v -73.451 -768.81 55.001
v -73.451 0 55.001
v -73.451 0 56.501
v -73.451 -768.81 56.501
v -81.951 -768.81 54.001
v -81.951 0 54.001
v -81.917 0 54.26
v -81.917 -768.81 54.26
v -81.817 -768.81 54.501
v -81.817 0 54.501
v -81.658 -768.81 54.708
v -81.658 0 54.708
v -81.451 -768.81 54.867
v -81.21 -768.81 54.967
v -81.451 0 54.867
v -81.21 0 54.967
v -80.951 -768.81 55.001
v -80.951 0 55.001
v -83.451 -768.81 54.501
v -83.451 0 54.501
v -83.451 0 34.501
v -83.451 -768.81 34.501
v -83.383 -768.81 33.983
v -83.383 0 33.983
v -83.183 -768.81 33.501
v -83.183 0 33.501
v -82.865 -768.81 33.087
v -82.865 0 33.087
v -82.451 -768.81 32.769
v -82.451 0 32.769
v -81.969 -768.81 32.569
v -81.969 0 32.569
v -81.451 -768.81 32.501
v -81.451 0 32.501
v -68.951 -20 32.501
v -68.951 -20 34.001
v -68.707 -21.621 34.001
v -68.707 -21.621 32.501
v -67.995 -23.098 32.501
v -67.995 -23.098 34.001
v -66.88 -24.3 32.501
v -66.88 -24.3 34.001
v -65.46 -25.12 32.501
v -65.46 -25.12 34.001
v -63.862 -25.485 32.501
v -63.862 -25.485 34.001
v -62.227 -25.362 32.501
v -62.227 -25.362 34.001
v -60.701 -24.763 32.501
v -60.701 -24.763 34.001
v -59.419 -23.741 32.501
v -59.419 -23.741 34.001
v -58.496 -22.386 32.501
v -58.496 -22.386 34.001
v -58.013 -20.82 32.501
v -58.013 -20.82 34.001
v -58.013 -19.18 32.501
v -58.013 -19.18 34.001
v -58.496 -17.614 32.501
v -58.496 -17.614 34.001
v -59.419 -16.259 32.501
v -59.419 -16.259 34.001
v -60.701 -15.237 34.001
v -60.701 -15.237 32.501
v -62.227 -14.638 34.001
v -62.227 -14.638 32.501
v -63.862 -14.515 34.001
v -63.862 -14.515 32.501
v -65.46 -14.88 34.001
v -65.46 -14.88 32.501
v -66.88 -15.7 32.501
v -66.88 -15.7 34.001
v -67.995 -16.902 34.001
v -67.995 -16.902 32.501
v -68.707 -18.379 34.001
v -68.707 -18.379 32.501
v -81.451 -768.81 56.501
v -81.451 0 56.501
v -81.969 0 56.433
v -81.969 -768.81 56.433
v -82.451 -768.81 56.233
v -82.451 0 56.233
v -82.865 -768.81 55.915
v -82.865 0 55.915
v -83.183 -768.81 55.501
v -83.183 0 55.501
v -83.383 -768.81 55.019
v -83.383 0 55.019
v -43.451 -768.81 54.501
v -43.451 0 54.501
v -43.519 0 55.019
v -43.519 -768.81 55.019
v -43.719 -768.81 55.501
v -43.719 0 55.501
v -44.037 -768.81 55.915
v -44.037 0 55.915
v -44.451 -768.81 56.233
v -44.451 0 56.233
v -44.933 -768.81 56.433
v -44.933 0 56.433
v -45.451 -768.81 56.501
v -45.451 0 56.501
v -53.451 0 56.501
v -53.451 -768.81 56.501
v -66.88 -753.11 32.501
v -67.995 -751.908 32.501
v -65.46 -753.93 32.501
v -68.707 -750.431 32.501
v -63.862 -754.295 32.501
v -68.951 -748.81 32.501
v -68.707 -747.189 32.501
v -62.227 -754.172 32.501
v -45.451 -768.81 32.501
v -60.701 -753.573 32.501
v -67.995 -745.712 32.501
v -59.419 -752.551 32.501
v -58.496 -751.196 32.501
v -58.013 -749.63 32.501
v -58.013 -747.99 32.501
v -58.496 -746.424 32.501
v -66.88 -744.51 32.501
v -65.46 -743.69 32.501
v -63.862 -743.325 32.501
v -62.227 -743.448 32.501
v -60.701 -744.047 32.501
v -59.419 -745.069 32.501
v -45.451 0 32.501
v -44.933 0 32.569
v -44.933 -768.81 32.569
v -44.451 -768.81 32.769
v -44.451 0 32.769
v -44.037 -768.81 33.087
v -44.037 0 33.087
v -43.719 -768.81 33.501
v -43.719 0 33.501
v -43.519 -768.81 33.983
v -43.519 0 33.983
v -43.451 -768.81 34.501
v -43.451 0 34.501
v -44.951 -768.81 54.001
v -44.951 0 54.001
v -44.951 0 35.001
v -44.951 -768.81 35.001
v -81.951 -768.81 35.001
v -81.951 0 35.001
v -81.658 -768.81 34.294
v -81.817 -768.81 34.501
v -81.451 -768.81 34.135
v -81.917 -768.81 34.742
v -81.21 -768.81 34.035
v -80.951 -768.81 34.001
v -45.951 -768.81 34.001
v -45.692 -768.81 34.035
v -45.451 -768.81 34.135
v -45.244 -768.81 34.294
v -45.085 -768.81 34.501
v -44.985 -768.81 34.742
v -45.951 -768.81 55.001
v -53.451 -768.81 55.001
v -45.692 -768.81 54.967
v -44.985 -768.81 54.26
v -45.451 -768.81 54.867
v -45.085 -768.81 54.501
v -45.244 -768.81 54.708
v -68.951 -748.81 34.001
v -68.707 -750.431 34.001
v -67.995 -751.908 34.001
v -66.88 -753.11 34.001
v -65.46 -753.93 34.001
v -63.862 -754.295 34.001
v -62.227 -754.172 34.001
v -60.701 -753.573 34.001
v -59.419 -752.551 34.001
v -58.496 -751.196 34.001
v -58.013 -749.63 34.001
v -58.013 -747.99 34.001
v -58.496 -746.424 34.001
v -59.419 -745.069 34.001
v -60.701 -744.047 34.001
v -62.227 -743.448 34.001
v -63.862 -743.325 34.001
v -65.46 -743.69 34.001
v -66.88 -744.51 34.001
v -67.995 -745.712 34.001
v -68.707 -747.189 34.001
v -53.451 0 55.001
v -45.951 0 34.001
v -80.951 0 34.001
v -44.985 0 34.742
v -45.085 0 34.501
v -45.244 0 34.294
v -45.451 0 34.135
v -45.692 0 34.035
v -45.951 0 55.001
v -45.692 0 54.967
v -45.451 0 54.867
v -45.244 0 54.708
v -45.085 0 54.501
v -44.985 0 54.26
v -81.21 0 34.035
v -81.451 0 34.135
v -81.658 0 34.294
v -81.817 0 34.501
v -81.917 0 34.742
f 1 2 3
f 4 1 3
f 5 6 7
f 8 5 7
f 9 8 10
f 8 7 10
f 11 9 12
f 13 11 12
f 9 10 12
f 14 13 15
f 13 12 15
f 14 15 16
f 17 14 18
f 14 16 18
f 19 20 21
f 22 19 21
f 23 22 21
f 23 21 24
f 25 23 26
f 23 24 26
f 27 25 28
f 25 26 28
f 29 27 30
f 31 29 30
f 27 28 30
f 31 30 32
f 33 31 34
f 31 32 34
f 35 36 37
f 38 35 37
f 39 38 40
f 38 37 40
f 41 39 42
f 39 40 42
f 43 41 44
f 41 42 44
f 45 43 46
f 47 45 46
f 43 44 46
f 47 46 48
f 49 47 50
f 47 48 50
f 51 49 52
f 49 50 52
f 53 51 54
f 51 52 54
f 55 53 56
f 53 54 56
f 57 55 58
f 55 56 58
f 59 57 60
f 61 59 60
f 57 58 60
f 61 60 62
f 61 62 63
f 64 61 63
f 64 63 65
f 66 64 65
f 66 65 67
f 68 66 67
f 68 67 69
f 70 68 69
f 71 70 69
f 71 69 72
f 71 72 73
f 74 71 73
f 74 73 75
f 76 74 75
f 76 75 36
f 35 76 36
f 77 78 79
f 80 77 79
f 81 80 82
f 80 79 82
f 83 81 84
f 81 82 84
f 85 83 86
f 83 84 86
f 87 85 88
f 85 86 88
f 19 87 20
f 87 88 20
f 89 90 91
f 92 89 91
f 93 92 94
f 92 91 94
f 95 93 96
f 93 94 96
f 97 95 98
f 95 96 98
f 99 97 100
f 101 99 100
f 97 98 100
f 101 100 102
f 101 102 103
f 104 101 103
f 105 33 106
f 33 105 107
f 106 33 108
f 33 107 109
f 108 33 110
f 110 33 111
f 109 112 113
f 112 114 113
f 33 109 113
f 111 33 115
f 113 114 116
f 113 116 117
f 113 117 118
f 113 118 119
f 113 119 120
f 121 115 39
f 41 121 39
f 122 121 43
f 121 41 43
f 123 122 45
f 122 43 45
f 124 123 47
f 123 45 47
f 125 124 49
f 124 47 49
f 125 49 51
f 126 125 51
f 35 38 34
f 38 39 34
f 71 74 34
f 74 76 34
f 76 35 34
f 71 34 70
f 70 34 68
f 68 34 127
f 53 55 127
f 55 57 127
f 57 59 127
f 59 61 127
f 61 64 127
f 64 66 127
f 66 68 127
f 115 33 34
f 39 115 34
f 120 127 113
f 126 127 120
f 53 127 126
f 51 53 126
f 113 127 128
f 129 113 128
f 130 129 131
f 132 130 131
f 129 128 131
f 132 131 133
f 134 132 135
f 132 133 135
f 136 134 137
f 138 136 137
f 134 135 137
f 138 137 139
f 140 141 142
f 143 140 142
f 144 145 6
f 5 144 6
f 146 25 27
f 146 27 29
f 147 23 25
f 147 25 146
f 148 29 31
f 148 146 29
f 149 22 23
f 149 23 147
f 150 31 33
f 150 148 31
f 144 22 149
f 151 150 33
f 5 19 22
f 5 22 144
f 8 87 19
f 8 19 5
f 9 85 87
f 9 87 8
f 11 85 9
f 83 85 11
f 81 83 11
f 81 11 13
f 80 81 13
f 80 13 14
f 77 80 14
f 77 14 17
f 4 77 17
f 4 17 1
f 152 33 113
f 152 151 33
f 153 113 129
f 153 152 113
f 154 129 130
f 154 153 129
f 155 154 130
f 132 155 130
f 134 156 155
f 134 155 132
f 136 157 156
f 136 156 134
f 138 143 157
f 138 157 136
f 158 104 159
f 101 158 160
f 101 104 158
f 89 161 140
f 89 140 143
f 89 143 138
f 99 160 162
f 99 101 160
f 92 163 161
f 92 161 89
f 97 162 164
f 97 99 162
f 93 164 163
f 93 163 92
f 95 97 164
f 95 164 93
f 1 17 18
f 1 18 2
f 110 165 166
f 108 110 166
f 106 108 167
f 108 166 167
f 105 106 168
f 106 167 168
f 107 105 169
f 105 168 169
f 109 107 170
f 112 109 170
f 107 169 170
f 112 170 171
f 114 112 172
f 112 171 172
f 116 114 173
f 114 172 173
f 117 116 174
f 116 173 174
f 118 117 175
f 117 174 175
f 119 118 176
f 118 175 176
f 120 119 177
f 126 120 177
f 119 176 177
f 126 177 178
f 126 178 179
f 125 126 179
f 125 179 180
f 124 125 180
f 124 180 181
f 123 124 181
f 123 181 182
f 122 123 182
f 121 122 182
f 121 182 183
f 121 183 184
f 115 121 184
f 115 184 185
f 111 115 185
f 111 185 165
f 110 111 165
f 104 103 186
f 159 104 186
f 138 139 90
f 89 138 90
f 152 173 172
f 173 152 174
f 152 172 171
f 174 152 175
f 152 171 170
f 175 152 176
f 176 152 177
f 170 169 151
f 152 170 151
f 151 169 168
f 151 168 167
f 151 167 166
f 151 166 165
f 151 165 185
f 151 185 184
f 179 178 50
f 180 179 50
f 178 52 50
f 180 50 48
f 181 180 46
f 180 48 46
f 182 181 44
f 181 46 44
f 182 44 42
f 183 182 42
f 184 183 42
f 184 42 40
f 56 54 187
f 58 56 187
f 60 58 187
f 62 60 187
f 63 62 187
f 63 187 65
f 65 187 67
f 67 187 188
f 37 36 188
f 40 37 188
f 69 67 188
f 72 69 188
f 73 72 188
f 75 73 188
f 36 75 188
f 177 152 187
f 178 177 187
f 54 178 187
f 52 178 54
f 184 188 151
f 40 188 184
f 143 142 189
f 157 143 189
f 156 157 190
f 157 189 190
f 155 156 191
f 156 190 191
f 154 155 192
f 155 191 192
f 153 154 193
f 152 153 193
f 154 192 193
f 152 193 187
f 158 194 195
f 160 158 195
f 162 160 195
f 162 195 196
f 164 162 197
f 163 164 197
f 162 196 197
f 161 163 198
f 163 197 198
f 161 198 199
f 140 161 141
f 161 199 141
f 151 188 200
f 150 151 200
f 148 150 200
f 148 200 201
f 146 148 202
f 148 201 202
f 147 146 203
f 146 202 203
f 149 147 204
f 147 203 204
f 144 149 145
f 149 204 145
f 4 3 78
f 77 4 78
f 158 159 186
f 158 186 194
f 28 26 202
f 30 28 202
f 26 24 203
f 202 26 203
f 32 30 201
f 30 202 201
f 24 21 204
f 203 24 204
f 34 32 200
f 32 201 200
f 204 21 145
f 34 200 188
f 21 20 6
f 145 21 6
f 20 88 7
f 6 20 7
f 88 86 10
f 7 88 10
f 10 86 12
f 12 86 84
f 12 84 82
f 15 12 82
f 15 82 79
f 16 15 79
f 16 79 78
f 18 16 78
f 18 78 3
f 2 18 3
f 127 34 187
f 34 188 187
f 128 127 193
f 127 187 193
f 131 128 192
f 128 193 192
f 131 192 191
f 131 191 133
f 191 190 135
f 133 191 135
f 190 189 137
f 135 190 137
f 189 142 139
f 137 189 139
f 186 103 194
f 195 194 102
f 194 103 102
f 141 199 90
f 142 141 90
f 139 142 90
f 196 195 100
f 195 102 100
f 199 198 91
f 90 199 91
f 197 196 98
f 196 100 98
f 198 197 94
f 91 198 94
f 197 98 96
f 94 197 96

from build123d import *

# Parameters (mm, degrees)
F1_DEPTH = 768.81
F3_D     = 11


with BuildPart() as f1:
    # F0 (on Front) → F1 (new body)
    with BuildSketch(Plane.XZ):
        with BuildLine():
            ThreePointArc((-83.451096, 34.500868), (-82.86531, 33.086655), (-81.451096, 32.500868))
            Line((-81.451096, 32.500868), (-45.451096, 32.500868))
            ThreePointArc((-45.451096, 32.500868), (-44.036883, 33.086655), (-43.451096, 34.500868))
            Line((-43.451096, 34.500868), (-43.451096, 54.500868))
            ThreePointArc((-43.451096, 54.500868), (-44.036883, 55.915082), (-45.451096, 56.500868))
            Line((-45.451096, 56.500868), (-53.451096, 56.500868))
            Line((-53.451096, 56.500868), (-53.451096, 55.000868))
            Line((-53.451096, 55.000868), (-45.951096, 55.000868))
            ThreePointArc((-45.951096, 55.000868), (-45.24399, 54.707975), (-44.951096, 54.000868))
            Line((-44.951096, 54.000868), (-44.951096, 35.000868))
            ThreePointArc((-44.951096, 35.000868), (-45.24399, 34.293762), (-45.951096, 34.000868))
            Line((-45.951096, 34.000868), (-80.951096, 34.000868))
            ThreePointArc((-80.951096, 34.000868), (-81.658203, 34.293762), (-81.951096, 35.000868))
            Line((-81.951096, 35.000868), (-81.951096, 54.000868))
            ThreePointArc((-81.951096, 54.000868), (-81.658203, 54.707975), (-80.951096, 55.000868))
            Line((-80.951096, 55.000868), (-73.451096, 55.000868))
            Line((-73.451096, 55.000868), (-73.451096, 56.500868))
            Line((-73.451096, 56.500868), (-81.451096, 56.500868))
            ThreePointArc((-81.451096, 56.500868), (-82.86531, 55.915082), (-83.451096, 54.500868))
            Line((-83.451096, 54.500868), (-83.451096, 34.500868))
        make_face()
    extrude(amount=F1_DEPTH)

    # F3 (through all)
    with Locations(Plane(origin=(0, 0, 32.500868), x_dir=(1, 0, 0), z_dir=(0, 0, -1))):
        with Locations((-63.451096, 748.81), (-63.451096, 20)):
            Hole(F3_D / 2)


solid = f1.part
